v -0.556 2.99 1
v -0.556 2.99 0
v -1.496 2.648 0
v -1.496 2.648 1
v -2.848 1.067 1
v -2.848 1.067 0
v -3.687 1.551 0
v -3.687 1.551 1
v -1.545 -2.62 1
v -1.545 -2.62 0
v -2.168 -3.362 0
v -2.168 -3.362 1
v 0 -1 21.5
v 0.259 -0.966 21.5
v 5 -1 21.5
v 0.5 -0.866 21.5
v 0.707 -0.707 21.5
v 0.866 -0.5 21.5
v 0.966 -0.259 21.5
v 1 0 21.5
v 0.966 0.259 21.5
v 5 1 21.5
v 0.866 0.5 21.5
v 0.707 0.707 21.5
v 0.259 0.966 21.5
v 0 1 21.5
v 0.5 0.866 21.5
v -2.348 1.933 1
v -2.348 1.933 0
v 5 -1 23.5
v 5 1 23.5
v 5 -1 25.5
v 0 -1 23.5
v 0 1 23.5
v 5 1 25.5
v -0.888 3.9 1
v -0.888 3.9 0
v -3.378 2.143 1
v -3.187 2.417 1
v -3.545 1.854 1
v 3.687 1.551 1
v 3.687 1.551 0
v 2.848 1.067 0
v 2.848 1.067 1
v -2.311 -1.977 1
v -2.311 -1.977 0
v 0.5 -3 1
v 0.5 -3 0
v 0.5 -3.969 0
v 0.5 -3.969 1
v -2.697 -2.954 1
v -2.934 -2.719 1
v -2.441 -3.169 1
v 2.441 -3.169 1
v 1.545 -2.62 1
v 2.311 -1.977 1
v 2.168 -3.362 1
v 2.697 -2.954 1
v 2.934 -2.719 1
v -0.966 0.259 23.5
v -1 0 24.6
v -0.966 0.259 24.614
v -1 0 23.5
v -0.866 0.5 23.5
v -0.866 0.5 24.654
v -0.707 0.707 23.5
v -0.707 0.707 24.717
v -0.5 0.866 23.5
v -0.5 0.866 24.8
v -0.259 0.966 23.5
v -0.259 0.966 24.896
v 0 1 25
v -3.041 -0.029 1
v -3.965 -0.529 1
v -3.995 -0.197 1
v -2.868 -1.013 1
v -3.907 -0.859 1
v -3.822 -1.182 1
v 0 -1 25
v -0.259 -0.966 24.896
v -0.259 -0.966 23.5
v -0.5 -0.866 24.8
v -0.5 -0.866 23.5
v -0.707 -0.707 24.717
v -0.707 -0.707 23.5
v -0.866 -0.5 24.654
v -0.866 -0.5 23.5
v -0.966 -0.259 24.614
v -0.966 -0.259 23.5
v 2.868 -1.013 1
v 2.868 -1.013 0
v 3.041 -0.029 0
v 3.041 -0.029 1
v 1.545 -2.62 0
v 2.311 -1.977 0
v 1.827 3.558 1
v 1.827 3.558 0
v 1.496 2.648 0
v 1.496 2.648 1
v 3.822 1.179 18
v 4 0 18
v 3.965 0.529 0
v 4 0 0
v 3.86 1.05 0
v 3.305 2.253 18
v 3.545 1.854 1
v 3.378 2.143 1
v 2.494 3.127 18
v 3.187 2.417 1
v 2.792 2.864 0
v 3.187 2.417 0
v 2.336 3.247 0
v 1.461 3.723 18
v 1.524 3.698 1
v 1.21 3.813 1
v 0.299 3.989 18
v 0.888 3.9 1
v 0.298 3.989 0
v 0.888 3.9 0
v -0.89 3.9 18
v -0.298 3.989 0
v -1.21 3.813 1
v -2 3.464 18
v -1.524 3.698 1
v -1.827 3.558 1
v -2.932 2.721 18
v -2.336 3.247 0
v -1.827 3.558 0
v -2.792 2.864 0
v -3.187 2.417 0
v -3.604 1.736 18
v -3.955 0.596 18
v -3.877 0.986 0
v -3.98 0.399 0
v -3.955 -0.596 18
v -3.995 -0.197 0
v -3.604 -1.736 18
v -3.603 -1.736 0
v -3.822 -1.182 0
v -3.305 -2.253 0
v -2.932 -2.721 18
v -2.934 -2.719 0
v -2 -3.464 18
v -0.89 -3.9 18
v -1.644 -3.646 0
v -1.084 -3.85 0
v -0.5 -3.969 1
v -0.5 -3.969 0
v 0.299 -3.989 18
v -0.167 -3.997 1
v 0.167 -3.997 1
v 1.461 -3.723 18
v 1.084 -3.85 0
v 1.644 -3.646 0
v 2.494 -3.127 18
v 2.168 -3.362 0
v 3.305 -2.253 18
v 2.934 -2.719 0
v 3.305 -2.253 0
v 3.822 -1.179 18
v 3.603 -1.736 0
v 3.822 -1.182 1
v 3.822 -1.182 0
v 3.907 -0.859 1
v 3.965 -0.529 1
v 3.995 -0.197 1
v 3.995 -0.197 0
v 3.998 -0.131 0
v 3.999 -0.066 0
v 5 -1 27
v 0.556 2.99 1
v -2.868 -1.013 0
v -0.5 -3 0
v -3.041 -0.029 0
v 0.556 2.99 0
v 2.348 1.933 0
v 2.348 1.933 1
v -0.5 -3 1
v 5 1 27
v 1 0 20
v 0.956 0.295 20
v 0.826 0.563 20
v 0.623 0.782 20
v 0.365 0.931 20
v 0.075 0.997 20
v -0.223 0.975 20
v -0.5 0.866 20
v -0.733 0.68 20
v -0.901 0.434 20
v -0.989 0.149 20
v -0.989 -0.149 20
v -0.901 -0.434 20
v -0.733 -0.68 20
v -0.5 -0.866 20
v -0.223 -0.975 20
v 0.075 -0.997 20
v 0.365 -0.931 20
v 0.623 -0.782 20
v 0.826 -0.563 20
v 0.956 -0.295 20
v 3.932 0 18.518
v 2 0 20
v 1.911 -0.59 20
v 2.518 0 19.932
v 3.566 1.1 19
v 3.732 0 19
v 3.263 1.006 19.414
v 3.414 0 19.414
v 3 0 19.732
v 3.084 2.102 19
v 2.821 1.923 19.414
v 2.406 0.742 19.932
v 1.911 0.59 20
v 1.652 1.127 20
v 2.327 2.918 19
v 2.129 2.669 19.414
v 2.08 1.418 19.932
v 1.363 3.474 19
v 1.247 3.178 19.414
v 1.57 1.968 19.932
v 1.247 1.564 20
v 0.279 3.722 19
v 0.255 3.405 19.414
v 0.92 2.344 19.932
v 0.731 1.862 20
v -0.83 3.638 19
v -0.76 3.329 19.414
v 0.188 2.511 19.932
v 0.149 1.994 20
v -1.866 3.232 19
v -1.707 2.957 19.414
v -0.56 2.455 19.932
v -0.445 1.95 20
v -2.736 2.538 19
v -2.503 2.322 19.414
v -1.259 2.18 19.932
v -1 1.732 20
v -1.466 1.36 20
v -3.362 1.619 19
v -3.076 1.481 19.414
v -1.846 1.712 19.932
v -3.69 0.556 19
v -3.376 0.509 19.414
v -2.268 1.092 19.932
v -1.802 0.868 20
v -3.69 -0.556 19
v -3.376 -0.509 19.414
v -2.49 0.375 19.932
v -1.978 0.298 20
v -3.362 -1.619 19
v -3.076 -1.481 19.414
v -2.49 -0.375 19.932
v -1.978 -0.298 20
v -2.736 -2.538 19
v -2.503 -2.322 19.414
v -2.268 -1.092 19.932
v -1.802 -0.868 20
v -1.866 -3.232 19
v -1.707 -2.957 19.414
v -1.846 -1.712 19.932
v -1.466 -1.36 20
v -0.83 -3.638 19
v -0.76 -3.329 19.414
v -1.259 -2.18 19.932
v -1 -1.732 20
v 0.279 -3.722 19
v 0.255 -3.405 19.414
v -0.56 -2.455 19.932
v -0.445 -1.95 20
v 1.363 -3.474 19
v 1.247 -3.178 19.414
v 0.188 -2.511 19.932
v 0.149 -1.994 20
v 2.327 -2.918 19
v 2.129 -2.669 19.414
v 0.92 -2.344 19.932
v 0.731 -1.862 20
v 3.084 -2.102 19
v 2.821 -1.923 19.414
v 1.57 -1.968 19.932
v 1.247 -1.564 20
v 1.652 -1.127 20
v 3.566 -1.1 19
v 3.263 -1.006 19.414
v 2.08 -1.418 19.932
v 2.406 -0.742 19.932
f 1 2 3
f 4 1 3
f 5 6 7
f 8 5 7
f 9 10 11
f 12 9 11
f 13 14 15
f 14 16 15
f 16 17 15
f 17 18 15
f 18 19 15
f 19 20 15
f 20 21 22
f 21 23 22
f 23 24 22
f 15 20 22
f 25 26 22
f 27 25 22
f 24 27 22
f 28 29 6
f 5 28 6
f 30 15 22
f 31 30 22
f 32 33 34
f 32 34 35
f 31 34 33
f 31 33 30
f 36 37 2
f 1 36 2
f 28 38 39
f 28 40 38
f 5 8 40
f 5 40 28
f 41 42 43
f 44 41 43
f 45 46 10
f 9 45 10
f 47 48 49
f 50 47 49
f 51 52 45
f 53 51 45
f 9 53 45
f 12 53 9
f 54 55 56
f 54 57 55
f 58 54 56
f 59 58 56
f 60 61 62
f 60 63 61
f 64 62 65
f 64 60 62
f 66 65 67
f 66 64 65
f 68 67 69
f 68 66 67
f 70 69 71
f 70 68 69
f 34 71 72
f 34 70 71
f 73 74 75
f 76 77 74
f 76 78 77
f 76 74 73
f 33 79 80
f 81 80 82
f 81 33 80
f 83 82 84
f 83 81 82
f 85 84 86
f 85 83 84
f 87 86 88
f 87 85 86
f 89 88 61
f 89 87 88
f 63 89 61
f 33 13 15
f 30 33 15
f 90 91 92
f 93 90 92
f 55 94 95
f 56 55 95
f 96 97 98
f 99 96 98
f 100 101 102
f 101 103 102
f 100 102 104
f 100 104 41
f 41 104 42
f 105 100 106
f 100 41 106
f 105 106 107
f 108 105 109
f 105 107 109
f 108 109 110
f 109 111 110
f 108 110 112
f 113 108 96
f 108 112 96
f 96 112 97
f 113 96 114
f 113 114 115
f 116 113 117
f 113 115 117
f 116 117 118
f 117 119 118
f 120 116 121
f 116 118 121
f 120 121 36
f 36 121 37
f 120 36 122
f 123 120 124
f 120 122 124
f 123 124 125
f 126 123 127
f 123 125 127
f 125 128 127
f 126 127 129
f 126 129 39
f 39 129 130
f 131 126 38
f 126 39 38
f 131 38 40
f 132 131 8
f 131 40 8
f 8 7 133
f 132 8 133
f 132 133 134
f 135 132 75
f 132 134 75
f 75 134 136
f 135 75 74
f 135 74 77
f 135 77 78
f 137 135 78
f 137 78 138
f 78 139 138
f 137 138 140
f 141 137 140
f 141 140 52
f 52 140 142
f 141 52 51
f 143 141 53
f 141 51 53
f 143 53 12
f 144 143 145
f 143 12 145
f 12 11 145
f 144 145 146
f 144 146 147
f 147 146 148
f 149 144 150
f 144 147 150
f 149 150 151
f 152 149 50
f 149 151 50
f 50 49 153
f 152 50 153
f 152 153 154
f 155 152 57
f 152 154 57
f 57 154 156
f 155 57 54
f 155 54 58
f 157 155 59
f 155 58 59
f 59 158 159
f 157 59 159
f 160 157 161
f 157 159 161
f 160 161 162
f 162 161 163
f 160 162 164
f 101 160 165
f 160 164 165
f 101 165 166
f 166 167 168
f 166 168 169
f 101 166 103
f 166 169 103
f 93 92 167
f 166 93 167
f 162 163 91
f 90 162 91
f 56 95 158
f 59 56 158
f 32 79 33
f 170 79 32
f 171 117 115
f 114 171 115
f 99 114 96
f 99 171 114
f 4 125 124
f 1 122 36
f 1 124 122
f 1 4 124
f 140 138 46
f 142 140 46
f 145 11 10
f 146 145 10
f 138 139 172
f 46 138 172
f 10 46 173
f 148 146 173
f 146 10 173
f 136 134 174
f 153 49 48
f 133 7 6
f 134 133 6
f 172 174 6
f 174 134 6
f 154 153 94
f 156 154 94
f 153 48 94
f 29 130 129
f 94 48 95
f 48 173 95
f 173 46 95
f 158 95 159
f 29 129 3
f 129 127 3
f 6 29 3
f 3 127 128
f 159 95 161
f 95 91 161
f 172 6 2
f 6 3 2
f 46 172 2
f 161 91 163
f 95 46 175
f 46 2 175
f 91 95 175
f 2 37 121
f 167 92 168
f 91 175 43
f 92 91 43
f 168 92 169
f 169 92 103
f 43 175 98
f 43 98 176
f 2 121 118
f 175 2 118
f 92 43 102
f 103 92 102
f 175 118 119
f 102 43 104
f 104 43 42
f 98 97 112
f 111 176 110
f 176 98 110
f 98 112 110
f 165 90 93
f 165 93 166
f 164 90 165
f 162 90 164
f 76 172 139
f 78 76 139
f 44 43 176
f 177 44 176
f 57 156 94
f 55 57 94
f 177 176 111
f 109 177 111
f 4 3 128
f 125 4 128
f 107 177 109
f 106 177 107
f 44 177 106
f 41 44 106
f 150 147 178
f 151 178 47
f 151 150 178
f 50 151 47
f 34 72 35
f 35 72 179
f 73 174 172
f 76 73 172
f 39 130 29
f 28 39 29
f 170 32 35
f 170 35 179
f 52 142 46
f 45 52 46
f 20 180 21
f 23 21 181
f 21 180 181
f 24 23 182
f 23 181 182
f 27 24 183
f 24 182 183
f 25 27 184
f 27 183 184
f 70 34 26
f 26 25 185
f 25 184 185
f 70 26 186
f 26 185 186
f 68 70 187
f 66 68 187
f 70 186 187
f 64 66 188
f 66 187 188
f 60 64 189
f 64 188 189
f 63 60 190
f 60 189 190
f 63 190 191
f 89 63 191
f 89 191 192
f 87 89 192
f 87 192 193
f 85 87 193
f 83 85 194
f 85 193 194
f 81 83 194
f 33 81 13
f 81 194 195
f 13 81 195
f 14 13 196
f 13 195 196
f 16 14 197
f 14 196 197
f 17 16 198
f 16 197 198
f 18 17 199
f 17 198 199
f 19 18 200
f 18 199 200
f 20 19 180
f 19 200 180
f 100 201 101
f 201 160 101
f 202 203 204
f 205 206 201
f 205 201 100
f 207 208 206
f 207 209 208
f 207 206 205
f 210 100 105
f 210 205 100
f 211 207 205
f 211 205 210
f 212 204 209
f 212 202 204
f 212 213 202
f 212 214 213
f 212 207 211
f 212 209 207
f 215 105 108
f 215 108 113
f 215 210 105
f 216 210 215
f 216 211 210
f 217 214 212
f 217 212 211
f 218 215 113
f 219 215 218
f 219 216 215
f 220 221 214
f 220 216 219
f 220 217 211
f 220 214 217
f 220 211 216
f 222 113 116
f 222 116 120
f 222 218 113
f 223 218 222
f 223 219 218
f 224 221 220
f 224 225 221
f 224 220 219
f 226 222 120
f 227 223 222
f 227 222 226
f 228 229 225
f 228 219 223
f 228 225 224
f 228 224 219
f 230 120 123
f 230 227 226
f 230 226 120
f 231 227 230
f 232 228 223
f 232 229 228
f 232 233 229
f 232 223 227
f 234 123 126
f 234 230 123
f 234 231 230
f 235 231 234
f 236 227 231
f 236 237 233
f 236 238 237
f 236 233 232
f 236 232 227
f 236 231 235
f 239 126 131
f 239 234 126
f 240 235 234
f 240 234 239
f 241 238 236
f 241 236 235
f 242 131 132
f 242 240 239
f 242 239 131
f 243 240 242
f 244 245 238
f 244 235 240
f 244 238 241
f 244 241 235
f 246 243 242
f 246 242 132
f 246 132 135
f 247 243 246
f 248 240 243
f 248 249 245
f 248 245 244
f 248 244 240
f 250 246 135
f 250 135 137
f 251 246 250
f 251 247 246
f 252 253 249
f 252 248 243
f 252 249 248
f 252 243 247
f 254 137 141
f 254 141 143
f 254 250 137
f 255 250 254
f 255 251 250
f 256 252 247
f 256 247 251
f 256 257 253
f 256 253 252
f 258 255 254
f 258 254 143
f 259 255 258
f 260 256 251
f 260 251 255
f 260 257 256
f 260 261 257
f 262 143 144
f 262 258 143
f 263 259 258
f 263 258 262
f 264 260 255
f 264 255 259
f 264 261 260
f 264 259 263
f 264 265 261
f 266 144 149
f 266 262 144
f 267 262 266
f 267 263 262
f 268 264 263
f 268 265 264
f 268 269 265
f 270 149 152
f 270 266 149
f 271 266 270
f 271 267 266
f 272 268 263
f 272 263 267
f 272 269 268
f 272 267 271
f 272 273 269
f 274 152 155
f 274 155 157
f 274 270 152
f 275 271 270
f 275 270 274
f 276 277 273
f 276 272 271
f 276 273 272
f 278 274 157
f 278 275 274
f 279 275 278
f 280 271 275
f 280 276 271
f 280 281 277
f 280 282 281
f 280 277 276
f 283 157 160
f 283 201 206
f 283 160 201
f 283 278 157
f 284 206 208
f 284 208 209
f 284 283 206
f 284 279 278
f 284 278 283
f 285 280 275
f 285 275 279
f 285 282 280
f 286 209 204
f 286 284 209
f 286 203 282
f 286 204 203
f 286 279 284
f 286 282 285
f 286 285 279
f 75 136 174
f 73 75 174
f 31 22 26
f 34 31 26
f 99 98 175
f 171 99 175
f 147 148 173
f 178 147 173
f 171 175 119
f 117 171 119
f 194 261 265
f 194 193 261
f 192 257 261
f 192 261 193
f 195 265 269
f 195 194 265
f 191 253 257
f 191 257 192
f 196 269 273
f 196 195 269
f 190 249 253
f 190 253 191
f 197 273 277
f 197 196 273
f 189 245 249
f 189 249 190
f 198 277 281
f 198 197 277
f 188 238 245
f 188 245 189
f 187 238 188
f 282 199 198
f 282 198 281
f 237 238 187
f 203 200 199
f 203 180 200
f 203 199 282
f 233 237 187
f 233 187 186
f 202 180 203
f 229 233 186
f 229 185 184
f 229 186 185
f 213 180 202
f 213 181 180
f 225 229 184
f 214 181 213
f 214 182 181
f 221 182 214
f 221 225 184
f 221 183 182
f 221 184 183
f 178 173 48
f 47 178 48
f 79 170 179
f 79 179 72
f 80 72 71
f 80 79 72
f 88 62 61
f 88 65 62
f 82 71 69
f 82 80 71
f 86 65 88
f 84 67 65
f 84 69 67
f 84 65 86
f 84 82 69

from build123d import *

# Parameters (mm, degrees)
F0_R      = 4
F1_DEPTH  = 20
F2_R      = 2
F3_R      = 1
F4_DEPTH  = 1.5
F6_DEPTH  = 2
F8_DEPTH  = 2
F9_R      = 0.9999
F11_DEPTH = 1


# Not quite as in the source:
# - a fillet or chamfer is up to 0.001 mm smaller than in the source, because OpenCascade refuses the exact size


with BuildPart() as f1:
    # F0 (on Top) → F1 (new body)
    with BuildSketch(Plane.XY):
        Circle(F0_R)
    extrude(amount=F1_DEPTH)

    # F2
    f2_edges = [f1.edges().sort_by_distance(p)[0] for p in [
        (-4, 0, 20),
    ]]
    fillet(f2_edges, radius=F2_R)

    # F3 (on face) → F4 (join)
    with BuildSketch(Plane.XY.offset(20)):
        Circle(F3_R)
    extrude(amount=F4_DEPTH)

    # F5 (on face) → F6 (join)
    with BuildSketch(Plane.XY.offset(21.5)):
        with BuildLine():
            Line((5, 1), (0, 1))
            ThreePointArc((0, 1), (-1, 0), (0, -1))
            Line((0, -1), (5, -1))
            Line((5, -1), (5, 1))
        make_face()
    extrude(amount=F6_DEPTH)

    # F7 (on face) → F8 (join)
    with BuildSketch(Plane.XZ.offset(1)):
        Polygon((-1, 23.5), (0, 23.5), (5, 25.5), (5, 27), (-1, 24.6), align=None)
    extrude(amount=-F8_DEPTH)

    # F9 (radius 1 in the source; OpenCascade refuses exactly that, so slightly less here)
    f9_edges = [f1.edges().sort_by_distance(p)[0] for p in [
        (-1, -1, 24.05),
        (-1, 1, 24.05),
    ]]
    fillet(f9_edges, radius=F9_R)

    # F10 (on face) → F11 (cut)
    with BuildSketch(Plane(origin=(0, 0, 0), x_dir=(1, 0, 0), z_dir=(0, 0, -1))):
        Polygon((0.5, 4), (0, 4), (-0.5, 4), (-0.5, 3), (0.5, 3), align=None)
        Polygon((2.3113850506, 1.9767395245), (2.9541726603, 2.7427839676), (2.5711504387, 3.0641777725), (2.1881282172, 3.3855715773), (1.5453406075, 2.6195271342), align=None)
        Polygon((3.0412473479, 0.0285406565), (4.0260551009, 0.2021888342), (3.939231012, 0.6945927107), (3.8524069232, 1.1869965872), (2.8675991702, 1.0133484095), align=None)
        Polygon((2.3480762114, -1.9330127019), (3.2141016151, -2.4330127019), (3.4641016151, -2), (3.7141016151, -1.5669872981), (2.8480762114, -1.0669872981), align=None)
        Polygon((0.5562141196, -2.990087934), (0.8982342629, -3.9297805548), (1.3680805733, -3.7587704831), (1.8379268837, -3.5877604115), (1.4959067404, -2.6480677907), align=None)
        Polygon((-1.4959067404, -2.6480677907), (-1.8379268837, -3.5877604115), (-1.3680805733, -3.7587704831), (-0.8982342629, -3.9297805548), (-0.5562141196, -2.990087934), align=None)
        Polygon((-2.8480762114, -1.0669872981), (-3.7141016151, -1.5669872981), (-3.4641016151, -2), (-3.2141016151, -2.4330127019), (-2.3480762114, -1.9330127019), align=None)
        Polygon((-2.8675991702, 1.0133484095), (-3.8524069232, 1.1869965872), (-3.939231012, 0.6945927107), (-4.0260551009, 0.2021888342), (-3.0412473479, 0.0285406565), align=None)
        Polygon((-1.5453406075, 2.6195271342), (-2.1881282172, 3.3855715773), (-2.5711504387, 3.0641777725), (-2.9541726603, 2.7427839676), (-2.3113850506, 1.9767395245), align=None)
    extrude(amount=-F11_DEPTH, mode=Mode.SUBTRACT)


solid = f1.part
